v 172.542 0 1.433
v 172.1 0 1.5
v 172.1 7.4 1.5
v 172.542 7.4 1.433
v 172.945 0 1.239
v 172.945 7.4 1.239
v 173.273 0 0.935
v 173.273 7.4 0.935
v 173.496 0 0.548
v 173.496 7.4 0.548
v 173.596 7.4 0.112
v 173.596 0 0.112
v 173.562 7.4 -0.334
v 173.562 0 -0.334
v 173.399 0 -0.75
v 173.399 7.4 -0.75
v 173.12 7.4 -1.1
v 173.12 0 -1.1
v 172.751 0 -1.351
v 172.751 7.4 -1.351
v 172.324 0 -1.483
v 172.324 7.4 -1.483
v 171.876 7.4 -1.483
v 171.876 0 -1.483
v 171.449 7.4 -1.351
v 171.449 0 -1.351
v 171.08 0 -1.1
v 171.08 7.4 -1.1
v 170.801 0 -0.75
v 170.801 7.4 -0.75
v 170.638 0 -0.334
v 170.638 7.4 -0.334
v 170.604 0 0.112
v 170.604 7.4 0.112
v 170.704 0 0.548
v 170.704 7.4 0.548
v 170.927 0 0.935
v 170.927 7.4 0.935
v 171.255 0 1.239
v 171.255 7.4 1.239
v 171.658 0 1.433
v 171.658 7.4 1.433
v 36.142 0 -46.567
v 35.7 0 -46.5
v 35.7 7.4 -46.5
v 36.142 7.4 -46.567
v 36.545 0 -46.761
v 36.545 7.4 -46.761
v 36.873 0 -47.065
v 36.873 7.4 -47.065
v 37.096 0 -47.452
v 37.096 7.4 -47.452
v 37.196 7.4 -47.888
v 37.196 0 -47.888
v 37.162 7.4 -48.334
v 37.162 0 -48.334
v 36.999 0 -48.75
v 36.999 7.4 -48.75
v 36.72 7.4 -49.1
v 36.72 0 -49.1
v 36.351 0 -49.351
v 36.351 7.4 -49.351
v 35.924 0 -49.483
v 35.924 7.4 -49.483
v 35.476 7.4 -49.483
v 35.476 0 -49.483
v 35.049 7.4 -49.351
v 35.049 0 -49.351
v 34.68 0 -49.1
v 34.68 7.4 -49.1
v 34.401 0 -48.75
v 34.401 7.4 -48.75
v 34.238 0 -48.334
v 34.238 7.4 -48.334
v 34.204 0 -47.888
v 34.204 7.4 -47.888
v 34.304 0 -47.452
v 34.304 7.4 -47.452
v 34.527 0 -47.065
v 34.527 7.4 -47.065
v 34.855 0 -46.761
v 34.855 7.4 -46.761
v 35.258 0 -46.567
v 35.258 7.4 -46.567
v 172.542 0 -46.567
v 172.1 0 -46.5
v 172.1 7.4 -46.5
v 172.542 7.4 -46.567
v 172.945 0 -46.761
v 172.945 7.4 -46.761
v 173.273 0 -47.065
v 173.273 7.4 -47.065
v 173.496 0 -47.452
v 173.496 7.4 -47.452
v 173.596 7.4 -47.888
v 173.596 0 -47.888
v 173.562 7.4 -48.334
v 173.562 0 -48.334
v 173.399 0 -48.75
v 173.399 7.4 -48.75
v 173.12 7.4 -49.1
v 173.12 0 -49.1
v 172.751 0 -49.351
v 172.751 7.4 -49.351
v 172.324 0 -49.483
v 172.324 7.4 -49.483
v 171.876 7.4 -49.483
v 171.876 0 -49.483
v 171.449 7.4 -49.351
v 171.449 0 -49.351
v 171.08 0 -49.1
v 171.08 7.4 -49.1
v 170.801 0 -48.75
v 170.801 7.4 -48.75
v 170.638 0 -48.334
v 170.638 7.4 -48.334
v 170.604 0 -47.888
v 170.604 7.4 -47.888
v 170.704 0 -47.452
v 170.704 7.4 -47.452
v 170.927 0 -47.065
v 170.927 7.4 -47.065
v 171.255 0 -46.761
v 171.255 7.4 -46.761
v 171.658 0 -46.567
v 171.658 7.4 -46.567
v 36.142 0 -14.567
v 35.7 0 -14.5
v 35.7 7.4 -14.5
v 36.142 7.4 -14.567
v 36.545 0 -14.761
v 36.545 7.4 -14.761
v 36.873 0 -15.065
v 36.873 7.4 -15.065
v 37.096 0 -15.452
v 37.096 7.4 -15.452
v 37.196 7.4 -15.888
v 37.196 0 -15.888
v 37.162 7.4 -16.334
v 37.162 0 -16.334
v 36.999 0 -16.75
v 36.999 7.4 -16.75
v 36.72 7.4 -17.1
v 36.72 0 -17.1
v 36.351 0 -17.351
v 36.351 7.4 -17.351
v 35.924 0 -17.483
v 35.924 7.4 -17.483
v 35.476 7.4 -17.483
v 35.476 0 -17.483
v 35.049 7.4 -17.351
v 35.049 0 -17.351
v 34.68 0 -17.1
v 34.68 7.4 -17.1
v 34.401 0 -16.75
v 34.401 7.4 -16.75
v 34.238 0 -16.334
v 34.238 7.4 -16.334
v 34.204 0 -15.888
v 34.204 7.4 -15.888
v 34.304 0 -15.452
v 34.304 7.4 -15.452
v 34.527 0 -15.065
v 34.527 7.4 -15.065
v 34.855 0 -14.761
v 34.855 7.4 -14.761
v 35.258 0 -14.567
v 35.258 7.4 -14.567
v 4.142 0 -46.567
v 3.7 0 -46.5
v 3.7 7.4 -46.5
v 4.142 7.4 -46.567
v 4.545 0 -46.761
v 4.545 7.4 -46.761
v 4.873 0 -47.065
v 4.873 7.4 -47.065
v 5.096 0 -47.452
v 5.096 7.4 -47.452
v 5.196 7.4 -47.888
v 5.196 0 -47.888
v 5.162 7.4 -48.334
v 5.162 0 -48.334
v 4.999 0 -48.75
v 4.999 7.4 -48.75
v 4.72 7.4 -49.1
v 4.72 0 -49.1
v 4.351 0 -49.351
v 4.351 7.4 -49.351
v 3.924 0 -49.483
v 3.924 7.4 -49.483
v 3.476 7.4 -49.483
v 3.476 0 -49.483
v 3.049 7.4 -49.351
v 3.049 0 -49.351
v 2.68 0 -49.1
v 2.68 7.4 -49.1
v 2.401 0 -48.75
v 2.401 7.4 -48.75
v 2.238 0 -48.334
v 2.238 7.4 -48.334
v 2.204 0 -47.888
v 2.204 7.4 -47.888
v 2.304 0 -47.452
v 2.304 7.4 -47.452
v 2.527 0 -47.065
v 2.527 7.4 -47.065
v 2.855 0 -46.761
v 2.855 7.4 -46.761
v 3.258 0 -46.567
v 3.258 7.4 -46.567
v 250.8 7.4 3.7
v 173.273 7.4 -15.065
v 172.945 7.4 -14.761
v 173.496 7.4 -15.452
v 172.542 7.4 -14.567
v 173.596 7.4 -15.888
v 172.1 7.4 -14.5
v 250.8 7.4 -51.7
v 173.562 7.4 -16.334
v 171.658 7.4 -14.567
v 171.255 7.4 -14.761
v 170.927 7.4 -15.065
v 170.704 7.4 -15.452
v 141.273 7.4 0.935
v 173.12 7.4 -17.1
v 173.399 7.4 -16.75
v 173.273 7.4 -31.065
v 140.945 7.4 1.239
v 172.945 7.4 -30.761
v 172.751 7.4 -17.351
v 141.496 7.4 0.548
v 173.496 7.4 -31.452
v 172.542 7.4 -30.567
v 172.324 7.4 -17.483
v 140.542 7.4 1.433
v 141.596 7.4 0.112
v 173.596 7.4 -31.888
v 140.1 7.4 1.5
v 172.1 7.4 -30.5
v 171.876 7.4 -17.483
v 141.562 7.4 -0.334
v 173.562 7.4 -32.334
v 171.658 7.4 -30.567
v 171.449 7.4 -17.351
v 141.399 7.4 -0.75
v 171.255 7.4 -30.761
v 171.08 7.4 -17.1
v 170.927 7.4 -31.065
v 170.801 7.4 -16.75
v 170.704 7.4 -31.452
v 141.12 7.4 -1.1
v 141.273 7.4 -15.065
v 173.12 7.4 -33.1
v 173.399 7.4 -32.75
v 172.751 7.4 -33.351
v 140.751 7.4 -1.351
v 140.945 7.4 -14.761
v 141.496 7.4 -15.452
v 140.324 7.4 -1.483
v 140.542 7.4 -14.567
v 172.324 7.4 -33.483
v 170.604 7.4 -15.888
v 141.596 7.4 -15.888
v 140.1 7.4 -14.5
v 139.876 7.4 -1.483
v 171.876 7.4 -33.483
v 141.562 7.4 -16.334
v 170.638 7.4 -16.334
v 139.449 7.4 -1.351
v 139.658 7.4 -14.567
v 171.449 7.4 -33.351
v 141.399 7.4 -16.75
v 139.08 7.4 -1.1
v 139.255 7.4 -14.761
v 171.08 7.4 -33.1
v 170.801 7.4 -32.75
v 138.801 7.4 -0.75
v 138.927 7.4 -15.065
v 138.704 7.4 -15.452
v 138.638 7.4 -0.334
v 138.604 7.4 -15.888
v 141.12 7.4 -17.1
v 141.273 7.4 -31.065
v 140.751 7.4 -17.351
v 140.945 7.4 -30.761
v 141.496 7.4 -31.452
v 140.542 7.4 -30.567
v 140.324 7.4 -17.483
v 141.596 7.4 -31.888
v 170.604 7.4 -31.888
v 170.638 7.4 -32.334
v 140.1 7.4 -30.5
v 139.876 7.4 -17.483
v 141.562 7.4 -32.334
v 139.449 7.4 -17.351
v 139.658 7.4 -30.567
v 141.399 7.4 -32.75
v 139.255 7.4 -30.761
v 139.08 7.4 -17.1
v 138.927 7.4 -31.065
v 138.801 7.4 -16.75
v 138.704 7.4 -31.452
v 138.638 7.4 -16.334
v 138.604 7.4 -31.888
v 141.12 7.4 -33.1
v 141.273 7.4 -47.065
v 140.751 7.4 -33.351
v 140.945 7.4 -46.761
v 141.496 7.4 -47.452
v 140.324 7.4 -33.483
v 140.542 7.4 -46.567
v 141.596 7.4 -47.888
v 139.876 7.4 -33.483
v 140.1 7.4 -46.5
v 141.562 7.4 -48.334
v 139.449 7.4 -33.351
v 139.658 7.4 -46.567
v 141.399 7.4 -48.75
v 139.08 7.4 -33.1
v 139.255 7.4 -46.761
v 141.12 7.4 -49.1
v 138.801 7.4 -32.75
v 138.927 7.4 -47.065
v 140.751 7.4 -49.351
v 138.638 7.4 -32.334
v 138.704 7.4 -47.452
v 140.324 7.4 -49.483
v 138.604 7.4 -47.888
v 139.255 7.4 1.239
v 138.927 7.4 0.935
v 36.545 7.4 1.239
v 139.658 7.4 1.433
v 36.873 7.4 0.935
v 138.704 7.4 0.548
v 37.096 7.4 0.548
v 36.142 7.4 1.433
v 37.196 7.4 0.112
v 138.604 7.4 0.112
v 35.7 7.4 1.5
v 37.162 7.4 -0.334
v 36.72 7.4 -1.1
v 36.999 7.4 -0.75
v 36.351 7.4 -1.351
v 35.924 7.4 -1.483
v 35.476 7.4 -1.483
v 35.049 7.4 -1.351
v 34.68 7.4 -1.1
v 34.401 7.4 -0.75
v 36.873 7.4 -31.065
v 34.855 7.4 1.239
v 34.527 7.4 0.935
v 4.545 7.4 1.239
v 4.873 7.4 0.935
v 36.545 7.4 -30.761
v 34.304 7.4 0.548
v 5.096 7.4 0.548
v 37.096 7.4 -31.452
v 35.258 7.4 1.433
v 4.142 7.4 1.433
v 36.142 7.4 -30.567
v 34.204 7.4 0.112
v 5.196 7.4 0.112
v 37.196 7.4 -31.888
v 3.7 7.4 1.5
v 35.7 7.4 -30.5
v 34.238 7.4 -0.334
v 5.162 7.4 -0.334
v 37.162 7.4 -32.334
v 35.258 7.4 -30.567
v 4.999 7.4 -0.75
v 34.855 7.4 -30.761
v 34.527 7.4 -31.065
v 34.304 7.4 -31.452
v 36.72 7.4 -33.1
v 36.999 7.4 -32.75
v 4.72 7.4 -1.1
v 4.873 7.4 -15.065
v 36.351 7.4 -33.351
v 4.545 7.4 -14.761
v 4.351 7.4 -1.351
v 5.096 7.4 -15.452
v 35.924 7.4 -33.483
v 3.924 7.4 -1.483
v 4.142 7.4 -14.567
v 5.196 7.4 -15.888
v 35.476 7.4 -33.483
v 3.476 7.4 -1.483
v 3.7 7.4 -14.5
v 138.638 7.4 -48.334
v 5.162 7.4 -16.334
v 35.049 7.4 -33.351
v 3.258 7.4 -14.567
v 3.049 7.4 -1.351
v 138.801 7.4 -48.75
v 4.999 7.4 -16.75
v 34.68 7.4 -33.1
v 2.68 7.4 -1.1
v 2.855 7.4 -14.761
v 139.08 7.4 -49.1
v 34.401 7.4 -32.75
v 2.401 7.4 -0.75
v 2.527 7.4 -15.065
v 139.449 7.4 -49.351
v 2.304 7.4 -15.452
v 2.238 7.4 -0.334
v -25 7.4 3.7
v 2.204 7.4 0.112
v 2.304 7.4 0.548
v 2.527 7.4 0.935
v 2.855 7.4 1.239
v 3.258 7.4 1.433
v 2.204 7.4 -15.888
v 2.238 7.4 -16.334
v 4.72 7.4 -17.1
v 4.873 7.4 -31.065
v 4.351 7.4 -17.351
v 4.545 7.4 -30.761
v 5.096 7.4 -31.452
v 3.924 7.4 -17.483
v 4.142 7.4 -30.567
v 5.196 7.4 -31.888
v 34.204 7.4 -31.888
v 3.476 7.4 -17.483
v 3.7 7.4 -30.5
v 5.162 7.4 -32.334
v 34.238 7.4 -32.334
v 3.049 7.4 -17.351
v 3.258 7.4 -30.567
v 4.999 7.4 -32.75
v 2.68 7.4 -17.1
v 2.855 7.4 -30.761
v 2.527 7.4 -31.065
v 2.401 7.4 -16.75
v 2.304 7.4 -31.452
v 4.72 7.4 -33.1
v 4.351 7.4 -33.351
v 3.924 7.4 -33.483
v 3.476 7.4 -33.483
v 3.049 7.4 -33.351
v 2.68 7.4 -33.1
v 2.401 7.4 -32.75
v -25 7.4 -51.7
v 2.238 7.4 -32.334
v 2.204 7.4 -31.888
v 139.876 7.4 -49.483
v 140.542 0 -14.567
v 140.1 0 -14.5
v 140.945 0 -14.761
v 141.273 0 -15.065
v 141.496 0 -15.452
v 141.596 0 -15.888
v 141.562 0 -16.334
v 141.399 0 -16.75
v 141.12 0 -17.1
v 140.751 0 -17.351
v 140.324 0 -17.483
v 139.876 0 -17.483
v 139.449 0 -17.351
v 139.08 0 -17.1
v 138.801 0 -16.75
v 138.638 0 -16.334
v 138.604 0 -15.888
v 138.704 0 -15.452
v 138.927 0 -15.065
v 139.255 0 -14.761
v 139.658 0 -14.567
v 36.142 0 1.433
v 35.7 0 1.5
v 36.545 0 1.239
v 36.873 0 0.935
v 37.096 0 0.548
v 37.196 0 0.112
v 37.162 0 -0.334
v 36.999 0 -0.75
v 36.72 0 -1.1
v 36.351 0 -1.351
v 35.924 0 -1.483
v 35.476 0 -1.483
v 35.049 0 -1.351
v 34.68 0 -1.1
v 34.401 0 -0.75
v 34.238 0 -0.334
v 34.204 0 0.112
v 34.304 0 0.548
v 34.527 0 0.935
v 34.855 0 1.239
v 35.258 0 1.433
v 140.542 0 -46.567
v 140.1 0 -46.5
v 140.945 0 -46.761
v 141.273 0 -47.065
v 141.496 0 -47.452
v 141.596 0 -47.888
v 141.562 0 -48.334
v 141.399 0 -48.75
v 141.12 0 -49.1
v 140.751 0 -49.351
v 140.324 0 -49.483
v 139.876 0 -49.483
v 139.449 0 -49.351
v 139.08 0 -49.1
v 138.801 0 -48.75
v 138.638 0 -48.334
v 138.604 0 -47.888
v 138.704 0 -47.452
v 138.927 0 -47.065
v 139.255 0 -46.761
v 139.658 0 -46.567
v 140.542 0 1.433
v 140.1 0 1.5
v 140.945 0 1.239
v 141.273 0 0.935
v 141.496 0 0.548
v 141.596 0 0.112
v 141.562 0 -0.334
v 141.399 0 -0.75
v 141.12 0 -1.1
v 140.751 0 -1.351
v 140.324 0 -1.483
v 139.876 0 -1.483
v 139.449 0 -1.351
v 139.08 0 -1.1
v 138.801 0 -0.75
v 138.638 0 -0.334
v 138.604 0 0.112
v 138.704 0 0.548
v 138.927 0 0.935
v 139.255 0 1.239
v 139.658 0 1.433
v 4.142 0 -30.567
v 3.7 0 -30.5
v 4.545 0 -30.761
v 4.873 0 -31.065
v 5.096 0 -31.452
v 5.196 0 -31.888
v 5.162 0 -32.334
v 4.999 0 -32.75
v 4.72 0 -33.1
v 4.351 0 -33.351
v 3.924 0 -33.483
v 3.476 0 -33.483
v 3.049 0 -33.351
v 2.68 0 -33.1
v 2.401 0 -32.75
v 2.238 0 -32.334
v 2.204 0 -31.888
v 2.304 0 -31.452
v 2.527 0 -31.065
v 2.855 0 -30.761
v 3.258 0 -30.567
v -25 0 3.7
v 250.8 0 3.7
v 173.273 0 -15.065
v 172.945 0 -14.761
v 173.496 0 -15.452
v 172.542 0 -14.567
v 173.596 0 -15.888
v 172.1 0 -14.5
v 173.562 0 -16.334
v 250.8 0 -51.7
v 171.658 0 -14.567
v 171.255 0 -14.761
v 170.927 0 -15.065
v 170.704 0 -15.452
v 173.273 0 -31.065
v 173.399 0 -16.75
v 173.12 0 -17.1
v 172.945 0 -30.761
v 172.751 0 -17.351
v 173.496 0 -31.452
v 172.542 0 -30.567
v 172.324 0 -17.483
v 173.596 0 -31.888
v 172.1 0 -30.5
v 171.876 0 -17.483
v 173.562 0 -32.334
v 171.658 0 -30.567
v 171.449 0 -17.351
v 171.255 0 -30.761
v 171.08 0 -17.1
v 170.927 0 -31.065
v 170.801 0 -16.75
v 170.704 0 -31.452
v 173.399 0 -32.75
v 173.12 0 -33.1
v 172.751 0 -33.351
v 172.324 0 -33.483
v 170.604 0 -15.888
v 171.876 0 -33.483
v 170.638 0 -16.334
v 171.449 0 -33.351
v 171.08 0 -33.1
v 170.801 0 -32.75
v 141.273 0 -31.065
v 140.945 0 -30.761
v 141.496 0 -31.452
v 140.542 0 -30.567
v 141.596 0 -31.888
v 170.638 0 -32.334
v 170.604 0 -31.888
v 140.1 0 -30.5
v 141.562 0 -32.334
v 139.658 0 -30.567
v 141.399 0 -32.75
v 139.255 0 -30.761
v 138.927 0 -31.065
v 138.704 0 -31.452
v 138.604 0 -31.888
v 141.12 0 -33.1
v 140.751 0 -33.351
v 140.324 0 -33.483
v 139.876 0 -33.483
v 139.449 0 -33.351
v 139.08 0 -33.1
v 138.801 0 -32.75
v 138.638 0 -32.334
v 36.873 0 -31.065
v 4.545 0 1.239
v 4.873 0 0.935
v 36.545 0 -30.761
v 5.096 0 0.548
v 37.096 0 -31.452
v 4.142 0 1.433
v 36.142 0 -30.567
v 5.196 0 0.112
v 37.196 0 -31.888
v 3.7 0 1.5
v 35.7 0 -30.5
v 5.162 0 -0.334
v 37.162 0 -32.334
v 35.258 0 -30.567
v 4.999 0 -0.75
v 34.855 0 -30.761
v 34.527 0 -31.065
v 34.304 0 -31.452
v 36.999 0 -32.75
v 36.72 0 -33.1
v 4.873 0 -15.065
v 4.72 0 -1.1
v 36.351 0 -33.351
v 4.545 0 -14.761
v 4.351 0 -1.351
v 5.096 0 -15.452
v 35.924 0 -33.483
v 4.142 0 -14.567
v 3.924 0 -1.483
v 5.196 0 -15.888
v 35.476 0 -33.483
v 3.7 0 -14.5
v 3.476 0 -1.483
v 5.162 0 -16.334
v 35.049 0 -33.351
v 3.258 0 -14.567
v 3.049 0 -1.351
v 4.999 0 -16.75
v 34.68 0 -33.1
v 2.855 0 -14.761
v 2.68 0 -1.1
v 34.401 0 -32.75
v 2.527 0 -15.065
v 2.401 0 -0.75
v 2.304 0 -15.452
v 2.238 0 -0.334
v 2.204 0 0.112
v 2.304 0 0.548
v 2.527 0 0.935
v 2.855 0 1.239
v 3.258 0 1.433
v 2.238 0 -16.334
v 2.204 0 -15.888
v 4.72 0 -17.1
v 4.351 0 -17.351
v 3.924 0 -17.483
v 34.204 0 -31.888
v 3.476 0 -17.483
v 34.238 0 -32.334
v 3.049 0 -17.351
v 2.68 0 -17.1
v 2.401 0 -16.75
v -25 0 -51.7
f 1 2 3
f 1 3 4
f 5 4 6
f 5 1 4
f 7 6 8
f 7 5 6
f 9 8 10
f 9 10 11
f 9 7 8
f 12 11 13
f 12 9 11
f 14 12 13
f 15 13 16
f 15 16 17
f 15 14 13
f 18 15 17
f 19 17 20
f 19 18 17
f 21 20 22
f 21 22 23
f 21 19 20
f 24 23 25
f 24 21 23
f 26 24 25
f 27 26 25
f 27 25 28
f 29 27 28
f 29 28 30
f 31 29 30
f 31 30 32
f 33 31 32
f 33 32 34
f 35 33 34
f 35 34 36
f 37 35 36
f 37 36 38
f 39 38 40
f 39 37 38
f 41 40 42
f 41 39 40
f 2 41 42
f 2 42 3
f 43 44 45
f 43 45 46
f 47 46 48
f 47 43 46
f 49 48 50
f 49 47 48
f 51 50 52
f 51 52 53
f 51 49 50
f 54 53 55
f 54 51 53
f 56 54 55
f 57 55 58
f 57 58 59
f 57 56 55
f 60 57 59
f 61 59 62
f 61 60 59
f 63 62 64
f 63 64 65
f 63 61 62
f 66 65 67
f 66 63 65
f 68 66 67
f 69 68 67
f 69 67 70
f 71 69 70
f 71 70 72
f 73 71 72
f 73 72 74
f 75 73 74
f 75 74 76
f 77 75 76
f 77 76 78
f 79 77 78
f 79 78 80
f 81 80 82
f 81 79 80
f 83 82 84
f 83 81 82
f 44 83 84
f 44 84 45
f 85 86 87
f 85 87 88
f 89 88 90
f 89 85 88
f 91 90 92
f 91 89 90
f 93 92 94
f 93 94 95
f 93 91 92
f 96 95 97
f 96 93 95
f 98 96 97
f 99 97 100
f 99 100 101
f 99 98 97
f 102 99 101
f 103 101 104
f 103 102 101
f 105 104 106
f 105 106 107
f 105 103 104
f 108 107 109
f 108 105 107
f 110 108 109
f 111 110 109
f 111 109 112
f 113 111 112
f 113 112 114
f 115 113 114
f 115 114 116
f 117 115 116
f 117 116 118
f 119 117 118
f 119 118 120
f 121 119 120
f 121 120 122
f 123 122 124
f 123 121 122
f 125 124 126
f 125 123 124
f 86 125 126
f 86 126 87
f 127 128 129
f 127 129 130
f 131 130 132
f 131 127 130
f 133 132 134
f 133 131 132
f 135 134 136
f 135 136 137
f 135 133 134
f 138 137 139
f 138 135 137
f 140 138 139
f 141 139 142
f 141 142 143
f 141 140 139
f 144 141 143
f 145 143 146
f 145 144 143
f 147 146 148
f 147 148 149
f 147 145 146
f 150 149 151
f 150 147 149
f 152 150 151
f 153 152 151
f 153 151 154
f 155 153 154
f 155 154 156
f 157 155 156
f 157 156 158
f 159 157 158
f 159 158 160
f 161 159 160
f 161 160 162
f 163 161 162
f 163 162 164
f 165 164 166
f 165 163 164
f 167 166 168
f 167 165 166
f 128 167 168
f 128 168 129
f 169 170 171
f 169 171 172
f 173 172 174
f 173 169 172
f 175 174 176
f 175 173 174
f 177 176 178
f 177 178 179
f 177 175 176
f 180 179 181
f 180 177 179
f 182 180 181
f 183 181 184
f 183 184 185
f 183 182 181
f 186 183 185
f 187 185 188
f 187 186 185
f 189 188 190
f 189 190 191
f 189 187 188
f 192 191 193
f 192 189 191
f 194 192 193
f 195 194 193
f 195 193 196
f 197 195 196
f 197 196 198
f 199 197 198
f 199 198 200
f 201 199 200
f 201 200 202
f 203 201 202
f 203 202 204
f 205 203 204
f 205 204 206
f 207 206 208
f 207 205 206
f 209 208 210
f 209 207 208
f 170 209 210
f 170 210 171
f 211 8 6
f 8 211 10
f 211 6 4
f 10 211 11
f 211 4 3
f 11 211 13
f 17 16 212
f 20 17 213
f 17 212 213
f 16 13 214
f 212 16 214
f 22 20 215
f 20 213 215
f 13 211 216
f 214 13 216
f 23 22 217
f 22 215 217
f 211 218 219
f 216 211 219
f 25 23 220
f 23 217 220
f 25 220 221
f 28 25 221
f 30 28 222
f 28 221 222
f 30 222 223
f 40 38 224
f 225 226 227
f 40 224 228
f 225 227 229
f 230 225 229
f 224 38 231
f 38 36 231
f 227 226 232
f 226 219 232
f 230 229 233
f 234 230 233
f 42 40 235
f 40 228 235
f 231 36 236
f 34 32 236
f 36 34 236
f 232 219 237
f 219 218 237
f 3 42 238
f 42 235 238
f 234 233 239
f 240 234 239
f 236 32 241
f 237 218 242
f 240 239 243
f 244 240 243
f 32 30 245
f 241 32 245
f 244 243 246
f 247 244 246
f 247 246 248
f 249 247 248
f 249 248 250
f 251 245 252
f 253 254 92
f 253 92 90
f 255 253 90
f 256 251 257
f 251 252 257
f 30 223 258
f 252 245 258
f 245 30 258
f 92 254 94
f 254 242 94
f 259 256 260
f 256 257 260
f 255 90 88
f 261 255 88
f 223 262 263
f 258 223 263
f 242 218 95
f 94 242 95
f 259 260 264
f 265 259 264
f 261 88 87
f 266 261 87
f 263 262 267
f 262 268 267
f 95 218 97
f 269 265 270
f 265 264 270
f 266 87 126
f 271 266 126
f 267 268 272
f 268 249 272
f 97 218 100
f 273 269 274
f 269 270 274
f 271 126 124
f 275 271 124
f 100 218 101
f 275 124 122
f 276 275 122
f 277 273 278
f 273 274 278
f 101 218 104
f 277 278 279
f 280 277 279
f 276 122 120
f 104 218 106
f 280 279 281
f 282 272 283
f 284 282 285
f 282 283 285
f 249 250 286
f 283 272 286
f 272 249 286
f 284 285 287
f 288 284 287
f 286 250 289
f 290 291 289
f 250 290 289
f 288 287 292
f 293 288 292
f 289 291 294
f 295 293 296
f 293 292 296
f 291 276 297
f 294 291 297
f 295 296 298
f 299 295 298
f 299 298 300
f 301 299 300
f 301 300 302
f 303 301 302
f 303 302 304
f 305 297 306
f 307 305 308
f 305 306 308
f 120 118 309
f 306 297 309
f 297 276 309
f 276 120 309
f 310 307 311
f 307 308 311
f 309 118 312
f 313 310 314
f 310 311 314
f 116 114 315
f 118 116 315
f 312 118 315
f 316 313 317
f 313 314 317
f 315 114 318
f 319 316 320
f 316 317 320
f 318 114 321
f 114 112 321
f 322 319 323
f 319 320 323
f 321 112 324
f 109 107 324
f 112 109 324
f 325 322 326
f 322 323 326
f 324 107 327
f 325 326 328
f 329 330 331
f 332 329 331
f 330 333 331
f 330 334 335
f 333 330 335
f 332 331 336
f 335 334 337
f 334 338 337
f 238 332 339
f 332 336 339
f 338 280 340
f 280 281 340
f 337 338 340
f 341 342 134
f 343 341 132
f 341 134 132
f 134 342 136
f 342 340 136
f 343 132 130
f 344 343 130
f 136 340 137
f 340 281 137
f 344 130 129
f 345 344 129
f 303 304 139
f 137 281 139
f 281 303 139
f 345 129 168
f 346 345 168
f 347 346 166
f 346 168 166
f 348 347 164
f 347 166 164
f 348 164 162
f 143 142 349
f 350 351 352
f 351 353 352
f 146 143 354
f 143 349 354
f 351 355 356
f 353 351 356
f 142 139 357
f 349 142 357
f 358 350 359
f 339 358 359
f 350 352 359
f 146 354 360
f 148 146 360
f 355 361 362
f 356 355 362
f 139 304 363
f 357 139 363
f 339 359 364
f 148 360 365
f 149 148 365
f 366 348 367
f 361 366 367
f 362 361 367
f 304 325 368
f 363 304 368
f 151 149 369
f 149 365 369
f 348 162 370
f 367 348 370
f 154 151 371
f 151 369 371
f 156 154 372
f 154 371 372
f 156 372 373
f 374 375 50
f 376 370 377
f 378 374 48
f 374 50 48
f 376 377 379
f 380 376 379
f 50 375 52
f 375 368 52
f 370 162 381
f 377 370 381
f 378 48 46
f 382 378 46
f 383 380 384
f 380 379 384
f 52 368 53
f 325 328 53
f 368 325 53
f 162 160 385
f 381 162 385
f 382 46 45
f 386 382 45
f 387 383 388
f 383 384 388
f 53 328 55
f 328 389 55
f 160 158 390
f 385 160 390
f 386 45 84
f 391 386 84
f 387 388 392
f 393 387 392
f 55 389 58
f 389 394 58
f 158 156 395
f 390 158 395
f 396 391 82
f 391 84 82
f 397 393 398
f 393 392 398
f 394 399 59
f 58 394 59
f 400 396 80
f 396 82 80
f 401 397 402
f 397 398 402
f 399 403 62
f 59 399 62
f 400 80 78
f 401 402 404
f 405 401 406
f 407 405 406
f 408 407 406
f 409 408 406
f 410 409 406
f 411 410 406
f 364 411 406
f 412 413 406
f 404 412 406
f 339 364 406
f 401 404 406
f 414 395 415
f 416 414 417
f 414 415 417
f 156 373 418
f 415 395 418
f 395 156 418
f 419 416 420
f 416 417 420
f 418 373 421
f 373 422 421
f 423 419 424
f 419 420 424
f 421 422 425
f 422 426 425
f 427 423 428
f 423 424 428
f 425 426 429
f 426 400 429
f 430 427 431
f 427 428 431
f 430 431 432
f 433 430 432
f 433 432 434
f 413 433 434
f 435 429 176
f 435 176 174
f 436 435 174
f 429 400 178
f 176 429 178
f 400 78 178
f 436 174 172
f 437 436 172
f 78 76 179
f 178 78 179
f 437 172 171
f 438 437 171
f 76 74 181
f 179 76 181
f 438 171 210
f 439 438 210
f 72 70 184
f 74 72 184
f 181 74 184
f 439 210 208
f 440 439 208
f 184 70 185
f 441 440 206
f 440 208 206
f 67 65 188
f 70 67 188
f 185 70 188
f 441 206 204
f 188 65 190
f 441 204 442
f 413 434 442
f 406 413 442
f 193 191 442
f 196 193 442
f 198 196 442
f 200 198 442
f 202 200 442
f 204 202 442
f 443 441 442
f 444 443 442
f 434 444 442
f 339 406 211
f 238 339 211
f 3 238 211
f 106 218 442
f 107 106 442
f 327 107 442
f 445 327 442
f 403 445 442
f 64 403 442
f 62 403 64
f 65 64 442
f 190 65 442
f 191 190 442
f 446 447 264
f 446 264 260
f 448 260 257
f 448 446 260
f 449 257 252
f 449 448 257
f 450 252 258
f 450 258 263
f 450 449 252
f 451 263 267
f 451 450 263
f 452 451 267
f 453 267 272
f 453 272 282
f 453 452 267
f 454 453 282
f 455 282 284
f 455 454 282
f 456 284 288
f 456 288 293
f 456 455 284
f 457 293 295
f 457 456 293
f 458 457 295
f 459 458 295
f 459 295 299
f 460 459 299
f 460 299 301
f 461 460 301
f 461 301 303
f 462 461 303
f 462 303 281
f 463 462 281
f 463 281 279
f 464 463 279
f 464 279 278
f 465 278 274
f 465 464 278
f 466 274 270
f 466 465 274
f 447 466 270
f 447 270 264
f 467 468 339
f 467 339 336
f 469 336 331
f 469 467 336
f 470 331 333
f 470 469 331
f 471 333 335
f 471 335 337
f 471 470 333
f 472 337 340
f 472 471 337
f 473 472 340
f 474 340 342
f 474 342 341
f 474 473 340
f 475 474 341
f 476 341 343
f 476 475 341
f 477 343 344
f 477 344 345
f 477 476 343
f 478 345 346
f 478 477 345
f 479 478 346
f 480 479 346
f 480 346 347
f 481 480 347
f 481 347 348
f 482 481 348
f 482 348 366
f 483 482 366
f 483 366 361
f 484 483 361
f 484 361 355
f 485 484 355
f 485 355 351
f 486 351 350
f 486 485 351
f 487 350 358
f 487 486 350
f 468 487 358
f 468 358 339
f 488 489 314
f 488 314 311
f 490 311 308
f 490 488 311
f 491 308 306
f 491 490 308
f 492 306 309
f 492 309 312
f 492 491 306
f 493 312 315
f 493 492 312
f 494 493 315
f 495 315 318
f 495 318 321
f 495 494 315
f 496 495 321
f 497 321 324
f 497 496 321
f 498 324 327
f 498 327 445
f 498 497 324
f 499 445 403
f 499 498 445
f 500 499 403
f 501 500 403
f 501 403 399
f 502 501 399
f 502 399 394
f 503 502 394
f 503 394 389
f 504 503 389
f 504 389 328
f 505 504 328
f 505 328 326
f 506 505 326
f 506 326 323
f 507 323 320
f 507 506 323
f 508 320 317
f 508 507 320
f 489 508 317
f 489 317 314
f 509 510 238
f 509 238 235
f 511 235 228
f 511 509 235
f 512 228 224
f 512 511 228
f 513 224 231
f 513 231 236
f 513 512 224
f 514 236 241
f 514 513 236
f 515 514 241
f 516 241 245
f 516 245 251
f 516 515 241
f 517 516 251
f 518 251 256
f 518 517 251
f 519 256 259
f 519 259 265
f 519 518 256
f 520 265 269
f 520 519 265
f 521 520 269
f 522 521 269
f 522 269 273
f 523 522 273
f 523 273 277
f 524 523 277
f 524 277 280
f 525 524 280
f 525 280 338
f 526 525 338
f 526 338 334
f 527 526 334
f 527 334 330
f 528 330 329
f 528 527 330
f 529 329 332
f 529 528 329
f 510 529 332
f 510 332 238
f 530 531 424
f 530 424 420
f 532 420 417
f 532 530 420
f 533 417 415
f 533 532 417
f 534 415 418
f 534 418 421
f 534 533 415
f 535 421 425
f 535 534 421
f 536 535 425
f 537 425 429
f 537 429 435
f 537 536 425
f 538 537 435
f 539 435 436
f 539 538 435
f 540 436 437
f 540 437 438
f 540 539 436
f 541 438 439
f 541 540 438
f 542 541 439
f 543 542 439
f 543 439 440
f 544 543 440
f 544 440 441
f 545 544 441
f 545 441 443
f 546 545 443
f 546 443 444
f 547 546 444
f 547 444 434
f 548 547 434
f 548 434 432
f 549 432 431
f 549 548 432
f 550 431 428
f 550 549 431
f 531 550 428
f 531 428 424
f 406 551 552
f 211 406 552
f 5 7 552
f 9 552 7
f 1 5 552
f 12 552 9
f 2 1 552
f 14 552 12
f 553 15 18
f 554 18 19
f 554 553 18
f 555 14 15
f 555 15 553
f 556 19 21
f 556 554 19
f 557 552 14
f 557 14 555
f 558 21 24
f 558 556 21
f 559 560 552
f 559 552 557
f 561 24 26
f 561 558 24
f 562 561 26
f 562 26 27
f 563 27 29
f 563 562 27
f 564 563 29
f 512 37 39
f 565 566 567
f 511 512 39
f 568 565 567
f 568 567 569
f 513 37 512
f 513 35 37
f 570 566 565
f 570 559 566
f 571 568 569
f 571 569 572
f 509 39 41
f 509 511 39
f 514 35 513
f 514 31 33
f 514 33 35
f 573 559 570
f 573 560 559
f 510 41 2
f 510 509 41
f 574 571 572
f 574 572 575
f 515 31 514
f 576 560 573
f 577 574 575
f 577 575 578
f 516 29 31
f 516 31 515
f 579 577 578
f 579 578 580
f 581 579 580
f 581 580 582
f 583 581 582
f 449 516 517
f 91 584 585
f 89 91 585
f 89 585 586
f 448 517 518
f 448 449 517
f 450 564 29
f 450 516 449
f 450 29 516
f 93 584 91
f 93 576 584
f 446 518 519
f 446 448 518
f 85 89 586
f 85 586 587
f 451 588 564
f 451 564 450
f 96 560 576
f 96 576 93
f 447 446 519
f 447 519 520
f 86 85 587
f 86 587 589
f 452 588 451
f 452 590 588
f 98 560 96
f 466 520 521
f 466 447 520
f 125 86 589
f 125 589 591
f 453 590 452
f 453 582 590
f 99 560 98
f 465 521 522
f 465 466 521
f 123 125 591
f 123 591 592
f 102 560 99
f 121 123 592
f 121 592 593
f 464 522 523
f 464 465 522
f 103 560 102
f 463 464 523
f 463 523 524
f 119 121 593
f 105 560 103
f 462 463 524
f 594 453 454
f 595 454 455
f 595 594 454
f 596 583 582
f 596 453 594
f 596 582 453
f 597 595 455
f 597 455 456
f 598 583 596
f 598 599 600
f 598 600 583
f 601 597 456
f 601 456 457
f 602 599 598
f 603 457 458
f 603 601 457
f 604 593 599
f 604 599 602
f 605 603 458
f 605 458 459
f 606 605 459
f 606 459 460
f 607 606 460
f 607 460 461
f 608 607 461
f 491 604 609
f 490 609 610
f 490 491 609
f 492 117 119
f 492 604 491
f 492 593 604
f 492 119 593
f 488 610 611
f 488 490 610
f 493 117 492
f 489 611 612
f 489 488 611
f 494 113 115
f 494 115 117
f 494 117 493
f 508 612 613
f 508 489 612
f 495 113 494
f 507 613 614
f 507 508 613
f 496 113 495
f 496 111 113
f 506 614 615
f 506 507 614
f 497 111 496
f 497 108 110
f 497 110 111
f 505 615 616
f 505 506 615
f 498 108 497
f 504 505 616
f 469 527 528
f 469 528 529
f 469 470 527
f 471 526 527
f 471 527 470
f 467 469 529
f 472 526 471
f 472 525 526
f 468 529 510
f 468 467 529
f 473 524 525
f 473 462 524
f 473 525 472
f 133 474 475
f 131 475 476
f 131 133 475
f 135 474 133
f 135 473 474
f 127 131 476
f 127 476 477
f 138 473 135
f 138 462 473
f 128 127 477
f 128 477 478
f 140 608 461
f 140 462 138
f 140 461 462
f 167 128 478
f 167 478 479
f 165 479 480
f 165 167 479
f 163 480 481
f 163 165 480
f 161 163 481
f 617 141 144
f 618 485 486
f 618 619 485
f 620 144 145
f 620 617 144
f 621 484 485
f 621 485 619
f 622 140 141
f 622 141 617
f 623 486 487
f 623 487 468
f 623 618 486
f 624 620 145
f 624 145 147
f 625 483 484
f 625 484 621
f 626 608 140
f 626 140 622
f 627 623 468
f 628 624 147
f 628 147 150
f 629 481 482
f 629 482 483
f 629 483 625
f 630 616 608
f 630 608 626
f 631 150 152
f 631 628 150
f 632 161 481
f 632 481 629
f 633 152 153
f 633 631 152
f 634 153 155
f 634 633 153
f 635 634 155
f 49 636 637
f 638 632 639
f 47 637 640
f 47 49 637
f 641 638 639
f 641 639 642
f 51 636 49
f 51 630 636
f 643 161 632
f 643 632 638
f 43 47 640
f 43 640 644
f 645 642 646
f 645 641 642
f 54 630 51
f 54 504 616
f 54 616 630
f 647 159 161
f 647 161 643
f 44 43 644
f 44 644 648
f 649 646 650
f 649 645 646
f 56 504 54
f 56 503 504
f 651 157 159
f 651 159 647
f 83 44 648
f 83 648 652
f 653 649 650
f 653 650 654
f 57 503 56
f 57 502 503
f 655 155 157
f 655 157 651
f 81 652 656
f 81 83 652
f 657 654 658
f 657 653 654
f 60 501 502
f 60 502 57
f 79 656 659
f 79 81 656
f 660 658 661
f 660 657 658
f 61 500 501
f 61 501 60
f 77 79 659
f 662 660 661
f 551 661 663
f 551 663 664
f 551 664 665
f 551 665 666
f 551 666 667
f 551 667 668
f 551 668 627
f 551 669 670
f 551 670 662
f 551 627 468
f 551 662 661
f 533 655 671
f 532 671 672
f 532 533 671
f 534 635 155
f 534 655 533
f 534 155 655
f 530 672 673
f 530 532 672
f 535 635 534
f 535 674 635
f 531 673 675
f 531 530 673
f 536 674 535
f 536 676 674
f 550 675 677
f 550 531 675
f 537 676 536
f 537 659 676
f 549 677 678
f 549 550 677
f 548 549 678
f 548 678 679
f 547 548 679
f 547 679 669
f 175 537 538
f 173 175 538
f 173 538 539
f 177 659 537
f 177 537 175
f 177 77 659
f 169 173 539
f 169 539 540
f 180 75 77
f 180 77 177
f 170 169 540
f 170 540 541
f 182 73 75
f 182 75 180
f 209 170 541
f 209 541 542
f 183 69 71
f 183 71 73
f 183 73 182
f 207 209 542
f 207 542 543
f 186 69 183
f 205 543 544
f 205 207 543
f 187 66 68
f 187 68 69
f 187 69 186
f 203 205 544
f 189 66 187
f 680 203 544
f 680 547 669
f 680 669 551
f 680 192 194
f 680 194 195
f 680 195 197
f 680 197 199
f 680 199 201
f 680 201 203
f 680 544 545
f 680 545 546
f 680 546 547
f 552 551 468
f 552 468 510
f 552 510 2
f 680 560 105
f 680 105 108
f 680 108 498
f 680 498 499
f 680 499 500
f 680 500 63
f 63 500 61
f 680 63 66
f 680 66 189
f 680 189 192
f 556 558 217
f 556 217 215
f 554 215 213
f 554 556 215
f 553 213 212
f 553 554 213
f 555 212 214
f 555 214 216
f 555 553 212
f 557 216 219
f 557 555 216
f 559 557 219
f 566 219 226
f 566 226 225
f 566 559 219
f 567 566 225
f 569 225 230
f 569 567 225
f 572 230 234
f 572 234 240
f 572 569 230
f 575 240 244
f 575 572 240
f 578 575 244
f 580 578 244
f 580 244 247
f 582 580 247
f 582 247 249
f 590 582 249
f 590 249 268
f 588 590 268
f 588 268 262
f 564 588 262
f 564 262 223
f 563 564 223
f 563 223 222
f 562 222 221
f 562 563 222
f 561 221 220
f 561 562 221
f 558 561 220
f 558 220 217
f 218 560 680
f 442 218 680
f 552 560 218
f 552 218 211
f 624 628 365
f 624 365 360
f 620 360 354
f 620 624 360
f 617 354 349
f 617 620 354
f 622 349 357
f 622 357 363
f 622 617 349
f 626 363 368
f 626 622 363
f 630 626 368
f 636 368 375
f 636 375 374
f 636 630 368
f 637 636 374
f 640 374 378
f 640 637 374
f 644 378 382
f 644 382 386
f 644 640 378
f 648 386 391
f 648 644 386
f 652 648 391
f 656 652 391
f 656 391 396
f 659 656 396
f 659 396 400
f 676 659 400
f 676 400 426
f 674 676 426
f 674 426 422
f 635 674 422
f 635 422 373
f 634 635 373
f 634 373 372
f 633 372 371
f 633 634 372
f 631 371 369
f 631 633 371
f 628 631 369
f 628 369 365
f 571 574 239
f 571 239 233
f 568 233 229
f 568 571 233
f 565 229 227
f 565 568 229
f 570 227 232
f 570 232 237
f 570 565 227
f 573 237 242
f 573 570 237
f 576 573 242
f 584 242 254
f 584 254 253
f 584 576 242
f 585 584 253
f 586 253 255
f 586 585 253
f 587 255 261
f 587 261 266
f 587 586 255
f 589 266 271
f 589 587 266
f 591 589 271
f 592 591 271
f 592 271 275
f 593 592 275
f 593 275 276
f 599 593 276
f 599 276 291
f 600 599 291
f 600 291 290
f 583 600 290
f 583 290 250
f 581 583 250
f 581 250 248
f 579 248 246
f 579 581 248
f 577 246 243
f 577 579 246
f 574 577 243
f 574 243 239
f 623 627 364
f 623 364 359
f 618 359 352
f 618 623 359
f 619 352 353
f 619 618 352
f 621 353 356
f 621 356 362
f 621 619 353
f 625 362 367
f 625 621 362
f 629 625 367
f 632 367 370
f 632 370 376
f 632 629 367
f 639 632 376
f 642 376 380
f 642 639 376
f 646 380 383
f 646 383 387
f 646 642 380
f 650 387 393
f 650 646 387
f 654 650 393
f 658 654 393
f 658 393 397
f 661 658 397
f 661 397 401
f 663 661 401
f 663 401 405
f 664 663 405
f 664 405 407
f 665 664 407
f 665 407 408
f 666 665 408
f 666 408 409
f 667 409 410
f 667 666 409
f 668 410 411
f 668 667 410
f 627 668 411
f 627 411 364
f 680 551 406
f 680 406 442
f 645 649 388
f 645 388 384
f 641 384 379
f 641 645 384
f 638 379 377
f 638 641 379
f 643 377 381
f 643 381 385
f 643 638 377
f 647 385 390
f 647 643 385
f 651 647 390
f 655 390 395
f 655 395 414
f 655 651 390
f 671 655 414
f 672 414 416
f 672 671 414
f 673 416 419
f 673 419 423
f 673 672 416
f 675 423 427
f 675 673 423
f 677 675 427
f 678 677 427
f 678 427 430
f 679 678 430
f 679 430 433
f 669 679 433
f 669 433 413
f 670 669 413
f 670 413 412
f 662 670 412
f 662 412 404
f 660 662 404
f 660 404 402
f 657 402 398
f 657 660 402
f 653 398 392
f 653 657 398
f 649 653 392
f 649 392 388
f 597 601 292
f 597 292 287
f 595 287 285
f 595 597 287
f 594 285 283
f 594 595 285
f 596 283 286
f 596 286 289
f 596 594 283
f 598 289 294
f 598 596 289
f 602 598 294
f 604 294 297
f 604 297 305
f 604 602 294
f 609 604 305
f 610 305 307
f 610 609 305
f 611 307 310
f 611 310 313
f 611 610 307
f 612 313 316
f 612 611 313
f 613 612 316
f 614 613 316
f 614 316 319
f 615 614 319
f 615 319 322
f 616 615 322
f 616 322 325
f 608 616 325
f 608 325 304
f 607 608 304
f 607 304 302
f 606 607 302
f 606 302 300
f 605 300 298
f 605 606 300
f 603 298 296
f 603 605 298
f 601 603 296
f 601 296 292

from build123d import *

# Parameters (mm, degrees)
BASE_SHOCK_PLATE_R             = 1.5
BASE_SHOCK_PLATE_EXTRUDE_DEPTH = 7.4


with BuildPart() as part:
    # Base-Shock-Plate → Base-Shock-Plate-Extrude (new body)
    with BuildSketch(Plane(origin=(0, 0, 0), x_dir=(1, 0, 0), z_dir=(0, 1, 0))):
        Polygon((250.8, -3.7), (0, -3.7), (-25, -3.7), (-25, 51.7), (0, 51.7), (250.8, 51.7), align=None)
        with Locations(Location((140.1, 16, 0), (0, 0, 270))):
            Circle(BASE_SHOCK_PLATE_R, mode=Mode.SUBTRACT)
        with Locations(Location((140.1, 48, 0), (0, 0, 270))):
            Circle(BASE_SHOCK_PLATE_R, mode=Mode.SUBTRACT)
        with Locations(Location((172.1, 0, 0), (0, 0, 270))):
            Circle(BASE_SHOCK_PLATE_R, mode=Mode.SUBTRACT)
        with Locations(Location((172.1, 32, 0), (0, 0, 270))):
            Circle(BASE_SHOCK_PLATE_R, mode=Mode.SUBTRACT)
        with Locations(Location((140.1, 32, 0), (0, 0, 270))):
            Circle(BASE_SHOCK_PLATE_R, mode=Mode.SUBTRACT)
        with Locations(Location((172.1, 48, 0), (0, 0, 270))):
            Circle(BASE_SHOCK_PLATE_R, mode=Mode.SUBTRACT)
        with Locations(Location((172.1, 16, 0), (0, 0, 270))):
            Circle(BASE_SHOCK_PLATE_R, mode=Mode.SUBTRACT)
        with Locations(Location((140.1, 0, 0), (0, 0, 270))):
            Circle(BASE_SHOCK_PLATE_R, mode=Mode.SUBTRACT)
        with Locations(Location((3.69999989, 16, 0), (0, 0, 270))):
            Circle(BASE_SHOCK_PLATE_R, mode=Mode.SUBTRACT)
        with Locations(Location((3.7, 48, 0), (0, 0, 270))):
            Circle(BASE_SHOCK_PLATE_R, mode=Mode.SUBTRACT)
        with Locations(Location((35.7, 0, 0), (0, 0, 270))):
            Circle(BASE_SHOCK_PLATE_R, mode=Mode.SUBTRACT)
        with Locations(Location((35.69999989, 32, 0), (0, 0, 270))):
            Circle(BASE_SHOCK_PLATE_R, mode=Mode.SUBTRACT)
        with Locations(Location((3.699999945, 32, 0), (0, 0, 270))):
            Circle(BASE_SHOCK_PLATE_R, mode=Mode.SUBTRACT)
        with Locations(Location((35.7, 48, 0), (0, 0, 270))):
            Circle(BASE_SHOCK_PLATE_R, mode=Mode.SUBTRACT)
        with Locations(Location((35.69999989, 16, 0), (0, 0, 270))):
            Circle(BASE_SHOCK_PLATE_R, mode=Mode.SUBTRACT)
        with Locations(Location((3.7, 0, 0), (0, 0, 270))):
            Circle(BASE_SHOCK_PLATE_R, mode=Mode.SUBTRACT)
    extrude(amount=BASE_SHOCK_PLATE_EXTRUDE_DEPTH)


solid = part.part
